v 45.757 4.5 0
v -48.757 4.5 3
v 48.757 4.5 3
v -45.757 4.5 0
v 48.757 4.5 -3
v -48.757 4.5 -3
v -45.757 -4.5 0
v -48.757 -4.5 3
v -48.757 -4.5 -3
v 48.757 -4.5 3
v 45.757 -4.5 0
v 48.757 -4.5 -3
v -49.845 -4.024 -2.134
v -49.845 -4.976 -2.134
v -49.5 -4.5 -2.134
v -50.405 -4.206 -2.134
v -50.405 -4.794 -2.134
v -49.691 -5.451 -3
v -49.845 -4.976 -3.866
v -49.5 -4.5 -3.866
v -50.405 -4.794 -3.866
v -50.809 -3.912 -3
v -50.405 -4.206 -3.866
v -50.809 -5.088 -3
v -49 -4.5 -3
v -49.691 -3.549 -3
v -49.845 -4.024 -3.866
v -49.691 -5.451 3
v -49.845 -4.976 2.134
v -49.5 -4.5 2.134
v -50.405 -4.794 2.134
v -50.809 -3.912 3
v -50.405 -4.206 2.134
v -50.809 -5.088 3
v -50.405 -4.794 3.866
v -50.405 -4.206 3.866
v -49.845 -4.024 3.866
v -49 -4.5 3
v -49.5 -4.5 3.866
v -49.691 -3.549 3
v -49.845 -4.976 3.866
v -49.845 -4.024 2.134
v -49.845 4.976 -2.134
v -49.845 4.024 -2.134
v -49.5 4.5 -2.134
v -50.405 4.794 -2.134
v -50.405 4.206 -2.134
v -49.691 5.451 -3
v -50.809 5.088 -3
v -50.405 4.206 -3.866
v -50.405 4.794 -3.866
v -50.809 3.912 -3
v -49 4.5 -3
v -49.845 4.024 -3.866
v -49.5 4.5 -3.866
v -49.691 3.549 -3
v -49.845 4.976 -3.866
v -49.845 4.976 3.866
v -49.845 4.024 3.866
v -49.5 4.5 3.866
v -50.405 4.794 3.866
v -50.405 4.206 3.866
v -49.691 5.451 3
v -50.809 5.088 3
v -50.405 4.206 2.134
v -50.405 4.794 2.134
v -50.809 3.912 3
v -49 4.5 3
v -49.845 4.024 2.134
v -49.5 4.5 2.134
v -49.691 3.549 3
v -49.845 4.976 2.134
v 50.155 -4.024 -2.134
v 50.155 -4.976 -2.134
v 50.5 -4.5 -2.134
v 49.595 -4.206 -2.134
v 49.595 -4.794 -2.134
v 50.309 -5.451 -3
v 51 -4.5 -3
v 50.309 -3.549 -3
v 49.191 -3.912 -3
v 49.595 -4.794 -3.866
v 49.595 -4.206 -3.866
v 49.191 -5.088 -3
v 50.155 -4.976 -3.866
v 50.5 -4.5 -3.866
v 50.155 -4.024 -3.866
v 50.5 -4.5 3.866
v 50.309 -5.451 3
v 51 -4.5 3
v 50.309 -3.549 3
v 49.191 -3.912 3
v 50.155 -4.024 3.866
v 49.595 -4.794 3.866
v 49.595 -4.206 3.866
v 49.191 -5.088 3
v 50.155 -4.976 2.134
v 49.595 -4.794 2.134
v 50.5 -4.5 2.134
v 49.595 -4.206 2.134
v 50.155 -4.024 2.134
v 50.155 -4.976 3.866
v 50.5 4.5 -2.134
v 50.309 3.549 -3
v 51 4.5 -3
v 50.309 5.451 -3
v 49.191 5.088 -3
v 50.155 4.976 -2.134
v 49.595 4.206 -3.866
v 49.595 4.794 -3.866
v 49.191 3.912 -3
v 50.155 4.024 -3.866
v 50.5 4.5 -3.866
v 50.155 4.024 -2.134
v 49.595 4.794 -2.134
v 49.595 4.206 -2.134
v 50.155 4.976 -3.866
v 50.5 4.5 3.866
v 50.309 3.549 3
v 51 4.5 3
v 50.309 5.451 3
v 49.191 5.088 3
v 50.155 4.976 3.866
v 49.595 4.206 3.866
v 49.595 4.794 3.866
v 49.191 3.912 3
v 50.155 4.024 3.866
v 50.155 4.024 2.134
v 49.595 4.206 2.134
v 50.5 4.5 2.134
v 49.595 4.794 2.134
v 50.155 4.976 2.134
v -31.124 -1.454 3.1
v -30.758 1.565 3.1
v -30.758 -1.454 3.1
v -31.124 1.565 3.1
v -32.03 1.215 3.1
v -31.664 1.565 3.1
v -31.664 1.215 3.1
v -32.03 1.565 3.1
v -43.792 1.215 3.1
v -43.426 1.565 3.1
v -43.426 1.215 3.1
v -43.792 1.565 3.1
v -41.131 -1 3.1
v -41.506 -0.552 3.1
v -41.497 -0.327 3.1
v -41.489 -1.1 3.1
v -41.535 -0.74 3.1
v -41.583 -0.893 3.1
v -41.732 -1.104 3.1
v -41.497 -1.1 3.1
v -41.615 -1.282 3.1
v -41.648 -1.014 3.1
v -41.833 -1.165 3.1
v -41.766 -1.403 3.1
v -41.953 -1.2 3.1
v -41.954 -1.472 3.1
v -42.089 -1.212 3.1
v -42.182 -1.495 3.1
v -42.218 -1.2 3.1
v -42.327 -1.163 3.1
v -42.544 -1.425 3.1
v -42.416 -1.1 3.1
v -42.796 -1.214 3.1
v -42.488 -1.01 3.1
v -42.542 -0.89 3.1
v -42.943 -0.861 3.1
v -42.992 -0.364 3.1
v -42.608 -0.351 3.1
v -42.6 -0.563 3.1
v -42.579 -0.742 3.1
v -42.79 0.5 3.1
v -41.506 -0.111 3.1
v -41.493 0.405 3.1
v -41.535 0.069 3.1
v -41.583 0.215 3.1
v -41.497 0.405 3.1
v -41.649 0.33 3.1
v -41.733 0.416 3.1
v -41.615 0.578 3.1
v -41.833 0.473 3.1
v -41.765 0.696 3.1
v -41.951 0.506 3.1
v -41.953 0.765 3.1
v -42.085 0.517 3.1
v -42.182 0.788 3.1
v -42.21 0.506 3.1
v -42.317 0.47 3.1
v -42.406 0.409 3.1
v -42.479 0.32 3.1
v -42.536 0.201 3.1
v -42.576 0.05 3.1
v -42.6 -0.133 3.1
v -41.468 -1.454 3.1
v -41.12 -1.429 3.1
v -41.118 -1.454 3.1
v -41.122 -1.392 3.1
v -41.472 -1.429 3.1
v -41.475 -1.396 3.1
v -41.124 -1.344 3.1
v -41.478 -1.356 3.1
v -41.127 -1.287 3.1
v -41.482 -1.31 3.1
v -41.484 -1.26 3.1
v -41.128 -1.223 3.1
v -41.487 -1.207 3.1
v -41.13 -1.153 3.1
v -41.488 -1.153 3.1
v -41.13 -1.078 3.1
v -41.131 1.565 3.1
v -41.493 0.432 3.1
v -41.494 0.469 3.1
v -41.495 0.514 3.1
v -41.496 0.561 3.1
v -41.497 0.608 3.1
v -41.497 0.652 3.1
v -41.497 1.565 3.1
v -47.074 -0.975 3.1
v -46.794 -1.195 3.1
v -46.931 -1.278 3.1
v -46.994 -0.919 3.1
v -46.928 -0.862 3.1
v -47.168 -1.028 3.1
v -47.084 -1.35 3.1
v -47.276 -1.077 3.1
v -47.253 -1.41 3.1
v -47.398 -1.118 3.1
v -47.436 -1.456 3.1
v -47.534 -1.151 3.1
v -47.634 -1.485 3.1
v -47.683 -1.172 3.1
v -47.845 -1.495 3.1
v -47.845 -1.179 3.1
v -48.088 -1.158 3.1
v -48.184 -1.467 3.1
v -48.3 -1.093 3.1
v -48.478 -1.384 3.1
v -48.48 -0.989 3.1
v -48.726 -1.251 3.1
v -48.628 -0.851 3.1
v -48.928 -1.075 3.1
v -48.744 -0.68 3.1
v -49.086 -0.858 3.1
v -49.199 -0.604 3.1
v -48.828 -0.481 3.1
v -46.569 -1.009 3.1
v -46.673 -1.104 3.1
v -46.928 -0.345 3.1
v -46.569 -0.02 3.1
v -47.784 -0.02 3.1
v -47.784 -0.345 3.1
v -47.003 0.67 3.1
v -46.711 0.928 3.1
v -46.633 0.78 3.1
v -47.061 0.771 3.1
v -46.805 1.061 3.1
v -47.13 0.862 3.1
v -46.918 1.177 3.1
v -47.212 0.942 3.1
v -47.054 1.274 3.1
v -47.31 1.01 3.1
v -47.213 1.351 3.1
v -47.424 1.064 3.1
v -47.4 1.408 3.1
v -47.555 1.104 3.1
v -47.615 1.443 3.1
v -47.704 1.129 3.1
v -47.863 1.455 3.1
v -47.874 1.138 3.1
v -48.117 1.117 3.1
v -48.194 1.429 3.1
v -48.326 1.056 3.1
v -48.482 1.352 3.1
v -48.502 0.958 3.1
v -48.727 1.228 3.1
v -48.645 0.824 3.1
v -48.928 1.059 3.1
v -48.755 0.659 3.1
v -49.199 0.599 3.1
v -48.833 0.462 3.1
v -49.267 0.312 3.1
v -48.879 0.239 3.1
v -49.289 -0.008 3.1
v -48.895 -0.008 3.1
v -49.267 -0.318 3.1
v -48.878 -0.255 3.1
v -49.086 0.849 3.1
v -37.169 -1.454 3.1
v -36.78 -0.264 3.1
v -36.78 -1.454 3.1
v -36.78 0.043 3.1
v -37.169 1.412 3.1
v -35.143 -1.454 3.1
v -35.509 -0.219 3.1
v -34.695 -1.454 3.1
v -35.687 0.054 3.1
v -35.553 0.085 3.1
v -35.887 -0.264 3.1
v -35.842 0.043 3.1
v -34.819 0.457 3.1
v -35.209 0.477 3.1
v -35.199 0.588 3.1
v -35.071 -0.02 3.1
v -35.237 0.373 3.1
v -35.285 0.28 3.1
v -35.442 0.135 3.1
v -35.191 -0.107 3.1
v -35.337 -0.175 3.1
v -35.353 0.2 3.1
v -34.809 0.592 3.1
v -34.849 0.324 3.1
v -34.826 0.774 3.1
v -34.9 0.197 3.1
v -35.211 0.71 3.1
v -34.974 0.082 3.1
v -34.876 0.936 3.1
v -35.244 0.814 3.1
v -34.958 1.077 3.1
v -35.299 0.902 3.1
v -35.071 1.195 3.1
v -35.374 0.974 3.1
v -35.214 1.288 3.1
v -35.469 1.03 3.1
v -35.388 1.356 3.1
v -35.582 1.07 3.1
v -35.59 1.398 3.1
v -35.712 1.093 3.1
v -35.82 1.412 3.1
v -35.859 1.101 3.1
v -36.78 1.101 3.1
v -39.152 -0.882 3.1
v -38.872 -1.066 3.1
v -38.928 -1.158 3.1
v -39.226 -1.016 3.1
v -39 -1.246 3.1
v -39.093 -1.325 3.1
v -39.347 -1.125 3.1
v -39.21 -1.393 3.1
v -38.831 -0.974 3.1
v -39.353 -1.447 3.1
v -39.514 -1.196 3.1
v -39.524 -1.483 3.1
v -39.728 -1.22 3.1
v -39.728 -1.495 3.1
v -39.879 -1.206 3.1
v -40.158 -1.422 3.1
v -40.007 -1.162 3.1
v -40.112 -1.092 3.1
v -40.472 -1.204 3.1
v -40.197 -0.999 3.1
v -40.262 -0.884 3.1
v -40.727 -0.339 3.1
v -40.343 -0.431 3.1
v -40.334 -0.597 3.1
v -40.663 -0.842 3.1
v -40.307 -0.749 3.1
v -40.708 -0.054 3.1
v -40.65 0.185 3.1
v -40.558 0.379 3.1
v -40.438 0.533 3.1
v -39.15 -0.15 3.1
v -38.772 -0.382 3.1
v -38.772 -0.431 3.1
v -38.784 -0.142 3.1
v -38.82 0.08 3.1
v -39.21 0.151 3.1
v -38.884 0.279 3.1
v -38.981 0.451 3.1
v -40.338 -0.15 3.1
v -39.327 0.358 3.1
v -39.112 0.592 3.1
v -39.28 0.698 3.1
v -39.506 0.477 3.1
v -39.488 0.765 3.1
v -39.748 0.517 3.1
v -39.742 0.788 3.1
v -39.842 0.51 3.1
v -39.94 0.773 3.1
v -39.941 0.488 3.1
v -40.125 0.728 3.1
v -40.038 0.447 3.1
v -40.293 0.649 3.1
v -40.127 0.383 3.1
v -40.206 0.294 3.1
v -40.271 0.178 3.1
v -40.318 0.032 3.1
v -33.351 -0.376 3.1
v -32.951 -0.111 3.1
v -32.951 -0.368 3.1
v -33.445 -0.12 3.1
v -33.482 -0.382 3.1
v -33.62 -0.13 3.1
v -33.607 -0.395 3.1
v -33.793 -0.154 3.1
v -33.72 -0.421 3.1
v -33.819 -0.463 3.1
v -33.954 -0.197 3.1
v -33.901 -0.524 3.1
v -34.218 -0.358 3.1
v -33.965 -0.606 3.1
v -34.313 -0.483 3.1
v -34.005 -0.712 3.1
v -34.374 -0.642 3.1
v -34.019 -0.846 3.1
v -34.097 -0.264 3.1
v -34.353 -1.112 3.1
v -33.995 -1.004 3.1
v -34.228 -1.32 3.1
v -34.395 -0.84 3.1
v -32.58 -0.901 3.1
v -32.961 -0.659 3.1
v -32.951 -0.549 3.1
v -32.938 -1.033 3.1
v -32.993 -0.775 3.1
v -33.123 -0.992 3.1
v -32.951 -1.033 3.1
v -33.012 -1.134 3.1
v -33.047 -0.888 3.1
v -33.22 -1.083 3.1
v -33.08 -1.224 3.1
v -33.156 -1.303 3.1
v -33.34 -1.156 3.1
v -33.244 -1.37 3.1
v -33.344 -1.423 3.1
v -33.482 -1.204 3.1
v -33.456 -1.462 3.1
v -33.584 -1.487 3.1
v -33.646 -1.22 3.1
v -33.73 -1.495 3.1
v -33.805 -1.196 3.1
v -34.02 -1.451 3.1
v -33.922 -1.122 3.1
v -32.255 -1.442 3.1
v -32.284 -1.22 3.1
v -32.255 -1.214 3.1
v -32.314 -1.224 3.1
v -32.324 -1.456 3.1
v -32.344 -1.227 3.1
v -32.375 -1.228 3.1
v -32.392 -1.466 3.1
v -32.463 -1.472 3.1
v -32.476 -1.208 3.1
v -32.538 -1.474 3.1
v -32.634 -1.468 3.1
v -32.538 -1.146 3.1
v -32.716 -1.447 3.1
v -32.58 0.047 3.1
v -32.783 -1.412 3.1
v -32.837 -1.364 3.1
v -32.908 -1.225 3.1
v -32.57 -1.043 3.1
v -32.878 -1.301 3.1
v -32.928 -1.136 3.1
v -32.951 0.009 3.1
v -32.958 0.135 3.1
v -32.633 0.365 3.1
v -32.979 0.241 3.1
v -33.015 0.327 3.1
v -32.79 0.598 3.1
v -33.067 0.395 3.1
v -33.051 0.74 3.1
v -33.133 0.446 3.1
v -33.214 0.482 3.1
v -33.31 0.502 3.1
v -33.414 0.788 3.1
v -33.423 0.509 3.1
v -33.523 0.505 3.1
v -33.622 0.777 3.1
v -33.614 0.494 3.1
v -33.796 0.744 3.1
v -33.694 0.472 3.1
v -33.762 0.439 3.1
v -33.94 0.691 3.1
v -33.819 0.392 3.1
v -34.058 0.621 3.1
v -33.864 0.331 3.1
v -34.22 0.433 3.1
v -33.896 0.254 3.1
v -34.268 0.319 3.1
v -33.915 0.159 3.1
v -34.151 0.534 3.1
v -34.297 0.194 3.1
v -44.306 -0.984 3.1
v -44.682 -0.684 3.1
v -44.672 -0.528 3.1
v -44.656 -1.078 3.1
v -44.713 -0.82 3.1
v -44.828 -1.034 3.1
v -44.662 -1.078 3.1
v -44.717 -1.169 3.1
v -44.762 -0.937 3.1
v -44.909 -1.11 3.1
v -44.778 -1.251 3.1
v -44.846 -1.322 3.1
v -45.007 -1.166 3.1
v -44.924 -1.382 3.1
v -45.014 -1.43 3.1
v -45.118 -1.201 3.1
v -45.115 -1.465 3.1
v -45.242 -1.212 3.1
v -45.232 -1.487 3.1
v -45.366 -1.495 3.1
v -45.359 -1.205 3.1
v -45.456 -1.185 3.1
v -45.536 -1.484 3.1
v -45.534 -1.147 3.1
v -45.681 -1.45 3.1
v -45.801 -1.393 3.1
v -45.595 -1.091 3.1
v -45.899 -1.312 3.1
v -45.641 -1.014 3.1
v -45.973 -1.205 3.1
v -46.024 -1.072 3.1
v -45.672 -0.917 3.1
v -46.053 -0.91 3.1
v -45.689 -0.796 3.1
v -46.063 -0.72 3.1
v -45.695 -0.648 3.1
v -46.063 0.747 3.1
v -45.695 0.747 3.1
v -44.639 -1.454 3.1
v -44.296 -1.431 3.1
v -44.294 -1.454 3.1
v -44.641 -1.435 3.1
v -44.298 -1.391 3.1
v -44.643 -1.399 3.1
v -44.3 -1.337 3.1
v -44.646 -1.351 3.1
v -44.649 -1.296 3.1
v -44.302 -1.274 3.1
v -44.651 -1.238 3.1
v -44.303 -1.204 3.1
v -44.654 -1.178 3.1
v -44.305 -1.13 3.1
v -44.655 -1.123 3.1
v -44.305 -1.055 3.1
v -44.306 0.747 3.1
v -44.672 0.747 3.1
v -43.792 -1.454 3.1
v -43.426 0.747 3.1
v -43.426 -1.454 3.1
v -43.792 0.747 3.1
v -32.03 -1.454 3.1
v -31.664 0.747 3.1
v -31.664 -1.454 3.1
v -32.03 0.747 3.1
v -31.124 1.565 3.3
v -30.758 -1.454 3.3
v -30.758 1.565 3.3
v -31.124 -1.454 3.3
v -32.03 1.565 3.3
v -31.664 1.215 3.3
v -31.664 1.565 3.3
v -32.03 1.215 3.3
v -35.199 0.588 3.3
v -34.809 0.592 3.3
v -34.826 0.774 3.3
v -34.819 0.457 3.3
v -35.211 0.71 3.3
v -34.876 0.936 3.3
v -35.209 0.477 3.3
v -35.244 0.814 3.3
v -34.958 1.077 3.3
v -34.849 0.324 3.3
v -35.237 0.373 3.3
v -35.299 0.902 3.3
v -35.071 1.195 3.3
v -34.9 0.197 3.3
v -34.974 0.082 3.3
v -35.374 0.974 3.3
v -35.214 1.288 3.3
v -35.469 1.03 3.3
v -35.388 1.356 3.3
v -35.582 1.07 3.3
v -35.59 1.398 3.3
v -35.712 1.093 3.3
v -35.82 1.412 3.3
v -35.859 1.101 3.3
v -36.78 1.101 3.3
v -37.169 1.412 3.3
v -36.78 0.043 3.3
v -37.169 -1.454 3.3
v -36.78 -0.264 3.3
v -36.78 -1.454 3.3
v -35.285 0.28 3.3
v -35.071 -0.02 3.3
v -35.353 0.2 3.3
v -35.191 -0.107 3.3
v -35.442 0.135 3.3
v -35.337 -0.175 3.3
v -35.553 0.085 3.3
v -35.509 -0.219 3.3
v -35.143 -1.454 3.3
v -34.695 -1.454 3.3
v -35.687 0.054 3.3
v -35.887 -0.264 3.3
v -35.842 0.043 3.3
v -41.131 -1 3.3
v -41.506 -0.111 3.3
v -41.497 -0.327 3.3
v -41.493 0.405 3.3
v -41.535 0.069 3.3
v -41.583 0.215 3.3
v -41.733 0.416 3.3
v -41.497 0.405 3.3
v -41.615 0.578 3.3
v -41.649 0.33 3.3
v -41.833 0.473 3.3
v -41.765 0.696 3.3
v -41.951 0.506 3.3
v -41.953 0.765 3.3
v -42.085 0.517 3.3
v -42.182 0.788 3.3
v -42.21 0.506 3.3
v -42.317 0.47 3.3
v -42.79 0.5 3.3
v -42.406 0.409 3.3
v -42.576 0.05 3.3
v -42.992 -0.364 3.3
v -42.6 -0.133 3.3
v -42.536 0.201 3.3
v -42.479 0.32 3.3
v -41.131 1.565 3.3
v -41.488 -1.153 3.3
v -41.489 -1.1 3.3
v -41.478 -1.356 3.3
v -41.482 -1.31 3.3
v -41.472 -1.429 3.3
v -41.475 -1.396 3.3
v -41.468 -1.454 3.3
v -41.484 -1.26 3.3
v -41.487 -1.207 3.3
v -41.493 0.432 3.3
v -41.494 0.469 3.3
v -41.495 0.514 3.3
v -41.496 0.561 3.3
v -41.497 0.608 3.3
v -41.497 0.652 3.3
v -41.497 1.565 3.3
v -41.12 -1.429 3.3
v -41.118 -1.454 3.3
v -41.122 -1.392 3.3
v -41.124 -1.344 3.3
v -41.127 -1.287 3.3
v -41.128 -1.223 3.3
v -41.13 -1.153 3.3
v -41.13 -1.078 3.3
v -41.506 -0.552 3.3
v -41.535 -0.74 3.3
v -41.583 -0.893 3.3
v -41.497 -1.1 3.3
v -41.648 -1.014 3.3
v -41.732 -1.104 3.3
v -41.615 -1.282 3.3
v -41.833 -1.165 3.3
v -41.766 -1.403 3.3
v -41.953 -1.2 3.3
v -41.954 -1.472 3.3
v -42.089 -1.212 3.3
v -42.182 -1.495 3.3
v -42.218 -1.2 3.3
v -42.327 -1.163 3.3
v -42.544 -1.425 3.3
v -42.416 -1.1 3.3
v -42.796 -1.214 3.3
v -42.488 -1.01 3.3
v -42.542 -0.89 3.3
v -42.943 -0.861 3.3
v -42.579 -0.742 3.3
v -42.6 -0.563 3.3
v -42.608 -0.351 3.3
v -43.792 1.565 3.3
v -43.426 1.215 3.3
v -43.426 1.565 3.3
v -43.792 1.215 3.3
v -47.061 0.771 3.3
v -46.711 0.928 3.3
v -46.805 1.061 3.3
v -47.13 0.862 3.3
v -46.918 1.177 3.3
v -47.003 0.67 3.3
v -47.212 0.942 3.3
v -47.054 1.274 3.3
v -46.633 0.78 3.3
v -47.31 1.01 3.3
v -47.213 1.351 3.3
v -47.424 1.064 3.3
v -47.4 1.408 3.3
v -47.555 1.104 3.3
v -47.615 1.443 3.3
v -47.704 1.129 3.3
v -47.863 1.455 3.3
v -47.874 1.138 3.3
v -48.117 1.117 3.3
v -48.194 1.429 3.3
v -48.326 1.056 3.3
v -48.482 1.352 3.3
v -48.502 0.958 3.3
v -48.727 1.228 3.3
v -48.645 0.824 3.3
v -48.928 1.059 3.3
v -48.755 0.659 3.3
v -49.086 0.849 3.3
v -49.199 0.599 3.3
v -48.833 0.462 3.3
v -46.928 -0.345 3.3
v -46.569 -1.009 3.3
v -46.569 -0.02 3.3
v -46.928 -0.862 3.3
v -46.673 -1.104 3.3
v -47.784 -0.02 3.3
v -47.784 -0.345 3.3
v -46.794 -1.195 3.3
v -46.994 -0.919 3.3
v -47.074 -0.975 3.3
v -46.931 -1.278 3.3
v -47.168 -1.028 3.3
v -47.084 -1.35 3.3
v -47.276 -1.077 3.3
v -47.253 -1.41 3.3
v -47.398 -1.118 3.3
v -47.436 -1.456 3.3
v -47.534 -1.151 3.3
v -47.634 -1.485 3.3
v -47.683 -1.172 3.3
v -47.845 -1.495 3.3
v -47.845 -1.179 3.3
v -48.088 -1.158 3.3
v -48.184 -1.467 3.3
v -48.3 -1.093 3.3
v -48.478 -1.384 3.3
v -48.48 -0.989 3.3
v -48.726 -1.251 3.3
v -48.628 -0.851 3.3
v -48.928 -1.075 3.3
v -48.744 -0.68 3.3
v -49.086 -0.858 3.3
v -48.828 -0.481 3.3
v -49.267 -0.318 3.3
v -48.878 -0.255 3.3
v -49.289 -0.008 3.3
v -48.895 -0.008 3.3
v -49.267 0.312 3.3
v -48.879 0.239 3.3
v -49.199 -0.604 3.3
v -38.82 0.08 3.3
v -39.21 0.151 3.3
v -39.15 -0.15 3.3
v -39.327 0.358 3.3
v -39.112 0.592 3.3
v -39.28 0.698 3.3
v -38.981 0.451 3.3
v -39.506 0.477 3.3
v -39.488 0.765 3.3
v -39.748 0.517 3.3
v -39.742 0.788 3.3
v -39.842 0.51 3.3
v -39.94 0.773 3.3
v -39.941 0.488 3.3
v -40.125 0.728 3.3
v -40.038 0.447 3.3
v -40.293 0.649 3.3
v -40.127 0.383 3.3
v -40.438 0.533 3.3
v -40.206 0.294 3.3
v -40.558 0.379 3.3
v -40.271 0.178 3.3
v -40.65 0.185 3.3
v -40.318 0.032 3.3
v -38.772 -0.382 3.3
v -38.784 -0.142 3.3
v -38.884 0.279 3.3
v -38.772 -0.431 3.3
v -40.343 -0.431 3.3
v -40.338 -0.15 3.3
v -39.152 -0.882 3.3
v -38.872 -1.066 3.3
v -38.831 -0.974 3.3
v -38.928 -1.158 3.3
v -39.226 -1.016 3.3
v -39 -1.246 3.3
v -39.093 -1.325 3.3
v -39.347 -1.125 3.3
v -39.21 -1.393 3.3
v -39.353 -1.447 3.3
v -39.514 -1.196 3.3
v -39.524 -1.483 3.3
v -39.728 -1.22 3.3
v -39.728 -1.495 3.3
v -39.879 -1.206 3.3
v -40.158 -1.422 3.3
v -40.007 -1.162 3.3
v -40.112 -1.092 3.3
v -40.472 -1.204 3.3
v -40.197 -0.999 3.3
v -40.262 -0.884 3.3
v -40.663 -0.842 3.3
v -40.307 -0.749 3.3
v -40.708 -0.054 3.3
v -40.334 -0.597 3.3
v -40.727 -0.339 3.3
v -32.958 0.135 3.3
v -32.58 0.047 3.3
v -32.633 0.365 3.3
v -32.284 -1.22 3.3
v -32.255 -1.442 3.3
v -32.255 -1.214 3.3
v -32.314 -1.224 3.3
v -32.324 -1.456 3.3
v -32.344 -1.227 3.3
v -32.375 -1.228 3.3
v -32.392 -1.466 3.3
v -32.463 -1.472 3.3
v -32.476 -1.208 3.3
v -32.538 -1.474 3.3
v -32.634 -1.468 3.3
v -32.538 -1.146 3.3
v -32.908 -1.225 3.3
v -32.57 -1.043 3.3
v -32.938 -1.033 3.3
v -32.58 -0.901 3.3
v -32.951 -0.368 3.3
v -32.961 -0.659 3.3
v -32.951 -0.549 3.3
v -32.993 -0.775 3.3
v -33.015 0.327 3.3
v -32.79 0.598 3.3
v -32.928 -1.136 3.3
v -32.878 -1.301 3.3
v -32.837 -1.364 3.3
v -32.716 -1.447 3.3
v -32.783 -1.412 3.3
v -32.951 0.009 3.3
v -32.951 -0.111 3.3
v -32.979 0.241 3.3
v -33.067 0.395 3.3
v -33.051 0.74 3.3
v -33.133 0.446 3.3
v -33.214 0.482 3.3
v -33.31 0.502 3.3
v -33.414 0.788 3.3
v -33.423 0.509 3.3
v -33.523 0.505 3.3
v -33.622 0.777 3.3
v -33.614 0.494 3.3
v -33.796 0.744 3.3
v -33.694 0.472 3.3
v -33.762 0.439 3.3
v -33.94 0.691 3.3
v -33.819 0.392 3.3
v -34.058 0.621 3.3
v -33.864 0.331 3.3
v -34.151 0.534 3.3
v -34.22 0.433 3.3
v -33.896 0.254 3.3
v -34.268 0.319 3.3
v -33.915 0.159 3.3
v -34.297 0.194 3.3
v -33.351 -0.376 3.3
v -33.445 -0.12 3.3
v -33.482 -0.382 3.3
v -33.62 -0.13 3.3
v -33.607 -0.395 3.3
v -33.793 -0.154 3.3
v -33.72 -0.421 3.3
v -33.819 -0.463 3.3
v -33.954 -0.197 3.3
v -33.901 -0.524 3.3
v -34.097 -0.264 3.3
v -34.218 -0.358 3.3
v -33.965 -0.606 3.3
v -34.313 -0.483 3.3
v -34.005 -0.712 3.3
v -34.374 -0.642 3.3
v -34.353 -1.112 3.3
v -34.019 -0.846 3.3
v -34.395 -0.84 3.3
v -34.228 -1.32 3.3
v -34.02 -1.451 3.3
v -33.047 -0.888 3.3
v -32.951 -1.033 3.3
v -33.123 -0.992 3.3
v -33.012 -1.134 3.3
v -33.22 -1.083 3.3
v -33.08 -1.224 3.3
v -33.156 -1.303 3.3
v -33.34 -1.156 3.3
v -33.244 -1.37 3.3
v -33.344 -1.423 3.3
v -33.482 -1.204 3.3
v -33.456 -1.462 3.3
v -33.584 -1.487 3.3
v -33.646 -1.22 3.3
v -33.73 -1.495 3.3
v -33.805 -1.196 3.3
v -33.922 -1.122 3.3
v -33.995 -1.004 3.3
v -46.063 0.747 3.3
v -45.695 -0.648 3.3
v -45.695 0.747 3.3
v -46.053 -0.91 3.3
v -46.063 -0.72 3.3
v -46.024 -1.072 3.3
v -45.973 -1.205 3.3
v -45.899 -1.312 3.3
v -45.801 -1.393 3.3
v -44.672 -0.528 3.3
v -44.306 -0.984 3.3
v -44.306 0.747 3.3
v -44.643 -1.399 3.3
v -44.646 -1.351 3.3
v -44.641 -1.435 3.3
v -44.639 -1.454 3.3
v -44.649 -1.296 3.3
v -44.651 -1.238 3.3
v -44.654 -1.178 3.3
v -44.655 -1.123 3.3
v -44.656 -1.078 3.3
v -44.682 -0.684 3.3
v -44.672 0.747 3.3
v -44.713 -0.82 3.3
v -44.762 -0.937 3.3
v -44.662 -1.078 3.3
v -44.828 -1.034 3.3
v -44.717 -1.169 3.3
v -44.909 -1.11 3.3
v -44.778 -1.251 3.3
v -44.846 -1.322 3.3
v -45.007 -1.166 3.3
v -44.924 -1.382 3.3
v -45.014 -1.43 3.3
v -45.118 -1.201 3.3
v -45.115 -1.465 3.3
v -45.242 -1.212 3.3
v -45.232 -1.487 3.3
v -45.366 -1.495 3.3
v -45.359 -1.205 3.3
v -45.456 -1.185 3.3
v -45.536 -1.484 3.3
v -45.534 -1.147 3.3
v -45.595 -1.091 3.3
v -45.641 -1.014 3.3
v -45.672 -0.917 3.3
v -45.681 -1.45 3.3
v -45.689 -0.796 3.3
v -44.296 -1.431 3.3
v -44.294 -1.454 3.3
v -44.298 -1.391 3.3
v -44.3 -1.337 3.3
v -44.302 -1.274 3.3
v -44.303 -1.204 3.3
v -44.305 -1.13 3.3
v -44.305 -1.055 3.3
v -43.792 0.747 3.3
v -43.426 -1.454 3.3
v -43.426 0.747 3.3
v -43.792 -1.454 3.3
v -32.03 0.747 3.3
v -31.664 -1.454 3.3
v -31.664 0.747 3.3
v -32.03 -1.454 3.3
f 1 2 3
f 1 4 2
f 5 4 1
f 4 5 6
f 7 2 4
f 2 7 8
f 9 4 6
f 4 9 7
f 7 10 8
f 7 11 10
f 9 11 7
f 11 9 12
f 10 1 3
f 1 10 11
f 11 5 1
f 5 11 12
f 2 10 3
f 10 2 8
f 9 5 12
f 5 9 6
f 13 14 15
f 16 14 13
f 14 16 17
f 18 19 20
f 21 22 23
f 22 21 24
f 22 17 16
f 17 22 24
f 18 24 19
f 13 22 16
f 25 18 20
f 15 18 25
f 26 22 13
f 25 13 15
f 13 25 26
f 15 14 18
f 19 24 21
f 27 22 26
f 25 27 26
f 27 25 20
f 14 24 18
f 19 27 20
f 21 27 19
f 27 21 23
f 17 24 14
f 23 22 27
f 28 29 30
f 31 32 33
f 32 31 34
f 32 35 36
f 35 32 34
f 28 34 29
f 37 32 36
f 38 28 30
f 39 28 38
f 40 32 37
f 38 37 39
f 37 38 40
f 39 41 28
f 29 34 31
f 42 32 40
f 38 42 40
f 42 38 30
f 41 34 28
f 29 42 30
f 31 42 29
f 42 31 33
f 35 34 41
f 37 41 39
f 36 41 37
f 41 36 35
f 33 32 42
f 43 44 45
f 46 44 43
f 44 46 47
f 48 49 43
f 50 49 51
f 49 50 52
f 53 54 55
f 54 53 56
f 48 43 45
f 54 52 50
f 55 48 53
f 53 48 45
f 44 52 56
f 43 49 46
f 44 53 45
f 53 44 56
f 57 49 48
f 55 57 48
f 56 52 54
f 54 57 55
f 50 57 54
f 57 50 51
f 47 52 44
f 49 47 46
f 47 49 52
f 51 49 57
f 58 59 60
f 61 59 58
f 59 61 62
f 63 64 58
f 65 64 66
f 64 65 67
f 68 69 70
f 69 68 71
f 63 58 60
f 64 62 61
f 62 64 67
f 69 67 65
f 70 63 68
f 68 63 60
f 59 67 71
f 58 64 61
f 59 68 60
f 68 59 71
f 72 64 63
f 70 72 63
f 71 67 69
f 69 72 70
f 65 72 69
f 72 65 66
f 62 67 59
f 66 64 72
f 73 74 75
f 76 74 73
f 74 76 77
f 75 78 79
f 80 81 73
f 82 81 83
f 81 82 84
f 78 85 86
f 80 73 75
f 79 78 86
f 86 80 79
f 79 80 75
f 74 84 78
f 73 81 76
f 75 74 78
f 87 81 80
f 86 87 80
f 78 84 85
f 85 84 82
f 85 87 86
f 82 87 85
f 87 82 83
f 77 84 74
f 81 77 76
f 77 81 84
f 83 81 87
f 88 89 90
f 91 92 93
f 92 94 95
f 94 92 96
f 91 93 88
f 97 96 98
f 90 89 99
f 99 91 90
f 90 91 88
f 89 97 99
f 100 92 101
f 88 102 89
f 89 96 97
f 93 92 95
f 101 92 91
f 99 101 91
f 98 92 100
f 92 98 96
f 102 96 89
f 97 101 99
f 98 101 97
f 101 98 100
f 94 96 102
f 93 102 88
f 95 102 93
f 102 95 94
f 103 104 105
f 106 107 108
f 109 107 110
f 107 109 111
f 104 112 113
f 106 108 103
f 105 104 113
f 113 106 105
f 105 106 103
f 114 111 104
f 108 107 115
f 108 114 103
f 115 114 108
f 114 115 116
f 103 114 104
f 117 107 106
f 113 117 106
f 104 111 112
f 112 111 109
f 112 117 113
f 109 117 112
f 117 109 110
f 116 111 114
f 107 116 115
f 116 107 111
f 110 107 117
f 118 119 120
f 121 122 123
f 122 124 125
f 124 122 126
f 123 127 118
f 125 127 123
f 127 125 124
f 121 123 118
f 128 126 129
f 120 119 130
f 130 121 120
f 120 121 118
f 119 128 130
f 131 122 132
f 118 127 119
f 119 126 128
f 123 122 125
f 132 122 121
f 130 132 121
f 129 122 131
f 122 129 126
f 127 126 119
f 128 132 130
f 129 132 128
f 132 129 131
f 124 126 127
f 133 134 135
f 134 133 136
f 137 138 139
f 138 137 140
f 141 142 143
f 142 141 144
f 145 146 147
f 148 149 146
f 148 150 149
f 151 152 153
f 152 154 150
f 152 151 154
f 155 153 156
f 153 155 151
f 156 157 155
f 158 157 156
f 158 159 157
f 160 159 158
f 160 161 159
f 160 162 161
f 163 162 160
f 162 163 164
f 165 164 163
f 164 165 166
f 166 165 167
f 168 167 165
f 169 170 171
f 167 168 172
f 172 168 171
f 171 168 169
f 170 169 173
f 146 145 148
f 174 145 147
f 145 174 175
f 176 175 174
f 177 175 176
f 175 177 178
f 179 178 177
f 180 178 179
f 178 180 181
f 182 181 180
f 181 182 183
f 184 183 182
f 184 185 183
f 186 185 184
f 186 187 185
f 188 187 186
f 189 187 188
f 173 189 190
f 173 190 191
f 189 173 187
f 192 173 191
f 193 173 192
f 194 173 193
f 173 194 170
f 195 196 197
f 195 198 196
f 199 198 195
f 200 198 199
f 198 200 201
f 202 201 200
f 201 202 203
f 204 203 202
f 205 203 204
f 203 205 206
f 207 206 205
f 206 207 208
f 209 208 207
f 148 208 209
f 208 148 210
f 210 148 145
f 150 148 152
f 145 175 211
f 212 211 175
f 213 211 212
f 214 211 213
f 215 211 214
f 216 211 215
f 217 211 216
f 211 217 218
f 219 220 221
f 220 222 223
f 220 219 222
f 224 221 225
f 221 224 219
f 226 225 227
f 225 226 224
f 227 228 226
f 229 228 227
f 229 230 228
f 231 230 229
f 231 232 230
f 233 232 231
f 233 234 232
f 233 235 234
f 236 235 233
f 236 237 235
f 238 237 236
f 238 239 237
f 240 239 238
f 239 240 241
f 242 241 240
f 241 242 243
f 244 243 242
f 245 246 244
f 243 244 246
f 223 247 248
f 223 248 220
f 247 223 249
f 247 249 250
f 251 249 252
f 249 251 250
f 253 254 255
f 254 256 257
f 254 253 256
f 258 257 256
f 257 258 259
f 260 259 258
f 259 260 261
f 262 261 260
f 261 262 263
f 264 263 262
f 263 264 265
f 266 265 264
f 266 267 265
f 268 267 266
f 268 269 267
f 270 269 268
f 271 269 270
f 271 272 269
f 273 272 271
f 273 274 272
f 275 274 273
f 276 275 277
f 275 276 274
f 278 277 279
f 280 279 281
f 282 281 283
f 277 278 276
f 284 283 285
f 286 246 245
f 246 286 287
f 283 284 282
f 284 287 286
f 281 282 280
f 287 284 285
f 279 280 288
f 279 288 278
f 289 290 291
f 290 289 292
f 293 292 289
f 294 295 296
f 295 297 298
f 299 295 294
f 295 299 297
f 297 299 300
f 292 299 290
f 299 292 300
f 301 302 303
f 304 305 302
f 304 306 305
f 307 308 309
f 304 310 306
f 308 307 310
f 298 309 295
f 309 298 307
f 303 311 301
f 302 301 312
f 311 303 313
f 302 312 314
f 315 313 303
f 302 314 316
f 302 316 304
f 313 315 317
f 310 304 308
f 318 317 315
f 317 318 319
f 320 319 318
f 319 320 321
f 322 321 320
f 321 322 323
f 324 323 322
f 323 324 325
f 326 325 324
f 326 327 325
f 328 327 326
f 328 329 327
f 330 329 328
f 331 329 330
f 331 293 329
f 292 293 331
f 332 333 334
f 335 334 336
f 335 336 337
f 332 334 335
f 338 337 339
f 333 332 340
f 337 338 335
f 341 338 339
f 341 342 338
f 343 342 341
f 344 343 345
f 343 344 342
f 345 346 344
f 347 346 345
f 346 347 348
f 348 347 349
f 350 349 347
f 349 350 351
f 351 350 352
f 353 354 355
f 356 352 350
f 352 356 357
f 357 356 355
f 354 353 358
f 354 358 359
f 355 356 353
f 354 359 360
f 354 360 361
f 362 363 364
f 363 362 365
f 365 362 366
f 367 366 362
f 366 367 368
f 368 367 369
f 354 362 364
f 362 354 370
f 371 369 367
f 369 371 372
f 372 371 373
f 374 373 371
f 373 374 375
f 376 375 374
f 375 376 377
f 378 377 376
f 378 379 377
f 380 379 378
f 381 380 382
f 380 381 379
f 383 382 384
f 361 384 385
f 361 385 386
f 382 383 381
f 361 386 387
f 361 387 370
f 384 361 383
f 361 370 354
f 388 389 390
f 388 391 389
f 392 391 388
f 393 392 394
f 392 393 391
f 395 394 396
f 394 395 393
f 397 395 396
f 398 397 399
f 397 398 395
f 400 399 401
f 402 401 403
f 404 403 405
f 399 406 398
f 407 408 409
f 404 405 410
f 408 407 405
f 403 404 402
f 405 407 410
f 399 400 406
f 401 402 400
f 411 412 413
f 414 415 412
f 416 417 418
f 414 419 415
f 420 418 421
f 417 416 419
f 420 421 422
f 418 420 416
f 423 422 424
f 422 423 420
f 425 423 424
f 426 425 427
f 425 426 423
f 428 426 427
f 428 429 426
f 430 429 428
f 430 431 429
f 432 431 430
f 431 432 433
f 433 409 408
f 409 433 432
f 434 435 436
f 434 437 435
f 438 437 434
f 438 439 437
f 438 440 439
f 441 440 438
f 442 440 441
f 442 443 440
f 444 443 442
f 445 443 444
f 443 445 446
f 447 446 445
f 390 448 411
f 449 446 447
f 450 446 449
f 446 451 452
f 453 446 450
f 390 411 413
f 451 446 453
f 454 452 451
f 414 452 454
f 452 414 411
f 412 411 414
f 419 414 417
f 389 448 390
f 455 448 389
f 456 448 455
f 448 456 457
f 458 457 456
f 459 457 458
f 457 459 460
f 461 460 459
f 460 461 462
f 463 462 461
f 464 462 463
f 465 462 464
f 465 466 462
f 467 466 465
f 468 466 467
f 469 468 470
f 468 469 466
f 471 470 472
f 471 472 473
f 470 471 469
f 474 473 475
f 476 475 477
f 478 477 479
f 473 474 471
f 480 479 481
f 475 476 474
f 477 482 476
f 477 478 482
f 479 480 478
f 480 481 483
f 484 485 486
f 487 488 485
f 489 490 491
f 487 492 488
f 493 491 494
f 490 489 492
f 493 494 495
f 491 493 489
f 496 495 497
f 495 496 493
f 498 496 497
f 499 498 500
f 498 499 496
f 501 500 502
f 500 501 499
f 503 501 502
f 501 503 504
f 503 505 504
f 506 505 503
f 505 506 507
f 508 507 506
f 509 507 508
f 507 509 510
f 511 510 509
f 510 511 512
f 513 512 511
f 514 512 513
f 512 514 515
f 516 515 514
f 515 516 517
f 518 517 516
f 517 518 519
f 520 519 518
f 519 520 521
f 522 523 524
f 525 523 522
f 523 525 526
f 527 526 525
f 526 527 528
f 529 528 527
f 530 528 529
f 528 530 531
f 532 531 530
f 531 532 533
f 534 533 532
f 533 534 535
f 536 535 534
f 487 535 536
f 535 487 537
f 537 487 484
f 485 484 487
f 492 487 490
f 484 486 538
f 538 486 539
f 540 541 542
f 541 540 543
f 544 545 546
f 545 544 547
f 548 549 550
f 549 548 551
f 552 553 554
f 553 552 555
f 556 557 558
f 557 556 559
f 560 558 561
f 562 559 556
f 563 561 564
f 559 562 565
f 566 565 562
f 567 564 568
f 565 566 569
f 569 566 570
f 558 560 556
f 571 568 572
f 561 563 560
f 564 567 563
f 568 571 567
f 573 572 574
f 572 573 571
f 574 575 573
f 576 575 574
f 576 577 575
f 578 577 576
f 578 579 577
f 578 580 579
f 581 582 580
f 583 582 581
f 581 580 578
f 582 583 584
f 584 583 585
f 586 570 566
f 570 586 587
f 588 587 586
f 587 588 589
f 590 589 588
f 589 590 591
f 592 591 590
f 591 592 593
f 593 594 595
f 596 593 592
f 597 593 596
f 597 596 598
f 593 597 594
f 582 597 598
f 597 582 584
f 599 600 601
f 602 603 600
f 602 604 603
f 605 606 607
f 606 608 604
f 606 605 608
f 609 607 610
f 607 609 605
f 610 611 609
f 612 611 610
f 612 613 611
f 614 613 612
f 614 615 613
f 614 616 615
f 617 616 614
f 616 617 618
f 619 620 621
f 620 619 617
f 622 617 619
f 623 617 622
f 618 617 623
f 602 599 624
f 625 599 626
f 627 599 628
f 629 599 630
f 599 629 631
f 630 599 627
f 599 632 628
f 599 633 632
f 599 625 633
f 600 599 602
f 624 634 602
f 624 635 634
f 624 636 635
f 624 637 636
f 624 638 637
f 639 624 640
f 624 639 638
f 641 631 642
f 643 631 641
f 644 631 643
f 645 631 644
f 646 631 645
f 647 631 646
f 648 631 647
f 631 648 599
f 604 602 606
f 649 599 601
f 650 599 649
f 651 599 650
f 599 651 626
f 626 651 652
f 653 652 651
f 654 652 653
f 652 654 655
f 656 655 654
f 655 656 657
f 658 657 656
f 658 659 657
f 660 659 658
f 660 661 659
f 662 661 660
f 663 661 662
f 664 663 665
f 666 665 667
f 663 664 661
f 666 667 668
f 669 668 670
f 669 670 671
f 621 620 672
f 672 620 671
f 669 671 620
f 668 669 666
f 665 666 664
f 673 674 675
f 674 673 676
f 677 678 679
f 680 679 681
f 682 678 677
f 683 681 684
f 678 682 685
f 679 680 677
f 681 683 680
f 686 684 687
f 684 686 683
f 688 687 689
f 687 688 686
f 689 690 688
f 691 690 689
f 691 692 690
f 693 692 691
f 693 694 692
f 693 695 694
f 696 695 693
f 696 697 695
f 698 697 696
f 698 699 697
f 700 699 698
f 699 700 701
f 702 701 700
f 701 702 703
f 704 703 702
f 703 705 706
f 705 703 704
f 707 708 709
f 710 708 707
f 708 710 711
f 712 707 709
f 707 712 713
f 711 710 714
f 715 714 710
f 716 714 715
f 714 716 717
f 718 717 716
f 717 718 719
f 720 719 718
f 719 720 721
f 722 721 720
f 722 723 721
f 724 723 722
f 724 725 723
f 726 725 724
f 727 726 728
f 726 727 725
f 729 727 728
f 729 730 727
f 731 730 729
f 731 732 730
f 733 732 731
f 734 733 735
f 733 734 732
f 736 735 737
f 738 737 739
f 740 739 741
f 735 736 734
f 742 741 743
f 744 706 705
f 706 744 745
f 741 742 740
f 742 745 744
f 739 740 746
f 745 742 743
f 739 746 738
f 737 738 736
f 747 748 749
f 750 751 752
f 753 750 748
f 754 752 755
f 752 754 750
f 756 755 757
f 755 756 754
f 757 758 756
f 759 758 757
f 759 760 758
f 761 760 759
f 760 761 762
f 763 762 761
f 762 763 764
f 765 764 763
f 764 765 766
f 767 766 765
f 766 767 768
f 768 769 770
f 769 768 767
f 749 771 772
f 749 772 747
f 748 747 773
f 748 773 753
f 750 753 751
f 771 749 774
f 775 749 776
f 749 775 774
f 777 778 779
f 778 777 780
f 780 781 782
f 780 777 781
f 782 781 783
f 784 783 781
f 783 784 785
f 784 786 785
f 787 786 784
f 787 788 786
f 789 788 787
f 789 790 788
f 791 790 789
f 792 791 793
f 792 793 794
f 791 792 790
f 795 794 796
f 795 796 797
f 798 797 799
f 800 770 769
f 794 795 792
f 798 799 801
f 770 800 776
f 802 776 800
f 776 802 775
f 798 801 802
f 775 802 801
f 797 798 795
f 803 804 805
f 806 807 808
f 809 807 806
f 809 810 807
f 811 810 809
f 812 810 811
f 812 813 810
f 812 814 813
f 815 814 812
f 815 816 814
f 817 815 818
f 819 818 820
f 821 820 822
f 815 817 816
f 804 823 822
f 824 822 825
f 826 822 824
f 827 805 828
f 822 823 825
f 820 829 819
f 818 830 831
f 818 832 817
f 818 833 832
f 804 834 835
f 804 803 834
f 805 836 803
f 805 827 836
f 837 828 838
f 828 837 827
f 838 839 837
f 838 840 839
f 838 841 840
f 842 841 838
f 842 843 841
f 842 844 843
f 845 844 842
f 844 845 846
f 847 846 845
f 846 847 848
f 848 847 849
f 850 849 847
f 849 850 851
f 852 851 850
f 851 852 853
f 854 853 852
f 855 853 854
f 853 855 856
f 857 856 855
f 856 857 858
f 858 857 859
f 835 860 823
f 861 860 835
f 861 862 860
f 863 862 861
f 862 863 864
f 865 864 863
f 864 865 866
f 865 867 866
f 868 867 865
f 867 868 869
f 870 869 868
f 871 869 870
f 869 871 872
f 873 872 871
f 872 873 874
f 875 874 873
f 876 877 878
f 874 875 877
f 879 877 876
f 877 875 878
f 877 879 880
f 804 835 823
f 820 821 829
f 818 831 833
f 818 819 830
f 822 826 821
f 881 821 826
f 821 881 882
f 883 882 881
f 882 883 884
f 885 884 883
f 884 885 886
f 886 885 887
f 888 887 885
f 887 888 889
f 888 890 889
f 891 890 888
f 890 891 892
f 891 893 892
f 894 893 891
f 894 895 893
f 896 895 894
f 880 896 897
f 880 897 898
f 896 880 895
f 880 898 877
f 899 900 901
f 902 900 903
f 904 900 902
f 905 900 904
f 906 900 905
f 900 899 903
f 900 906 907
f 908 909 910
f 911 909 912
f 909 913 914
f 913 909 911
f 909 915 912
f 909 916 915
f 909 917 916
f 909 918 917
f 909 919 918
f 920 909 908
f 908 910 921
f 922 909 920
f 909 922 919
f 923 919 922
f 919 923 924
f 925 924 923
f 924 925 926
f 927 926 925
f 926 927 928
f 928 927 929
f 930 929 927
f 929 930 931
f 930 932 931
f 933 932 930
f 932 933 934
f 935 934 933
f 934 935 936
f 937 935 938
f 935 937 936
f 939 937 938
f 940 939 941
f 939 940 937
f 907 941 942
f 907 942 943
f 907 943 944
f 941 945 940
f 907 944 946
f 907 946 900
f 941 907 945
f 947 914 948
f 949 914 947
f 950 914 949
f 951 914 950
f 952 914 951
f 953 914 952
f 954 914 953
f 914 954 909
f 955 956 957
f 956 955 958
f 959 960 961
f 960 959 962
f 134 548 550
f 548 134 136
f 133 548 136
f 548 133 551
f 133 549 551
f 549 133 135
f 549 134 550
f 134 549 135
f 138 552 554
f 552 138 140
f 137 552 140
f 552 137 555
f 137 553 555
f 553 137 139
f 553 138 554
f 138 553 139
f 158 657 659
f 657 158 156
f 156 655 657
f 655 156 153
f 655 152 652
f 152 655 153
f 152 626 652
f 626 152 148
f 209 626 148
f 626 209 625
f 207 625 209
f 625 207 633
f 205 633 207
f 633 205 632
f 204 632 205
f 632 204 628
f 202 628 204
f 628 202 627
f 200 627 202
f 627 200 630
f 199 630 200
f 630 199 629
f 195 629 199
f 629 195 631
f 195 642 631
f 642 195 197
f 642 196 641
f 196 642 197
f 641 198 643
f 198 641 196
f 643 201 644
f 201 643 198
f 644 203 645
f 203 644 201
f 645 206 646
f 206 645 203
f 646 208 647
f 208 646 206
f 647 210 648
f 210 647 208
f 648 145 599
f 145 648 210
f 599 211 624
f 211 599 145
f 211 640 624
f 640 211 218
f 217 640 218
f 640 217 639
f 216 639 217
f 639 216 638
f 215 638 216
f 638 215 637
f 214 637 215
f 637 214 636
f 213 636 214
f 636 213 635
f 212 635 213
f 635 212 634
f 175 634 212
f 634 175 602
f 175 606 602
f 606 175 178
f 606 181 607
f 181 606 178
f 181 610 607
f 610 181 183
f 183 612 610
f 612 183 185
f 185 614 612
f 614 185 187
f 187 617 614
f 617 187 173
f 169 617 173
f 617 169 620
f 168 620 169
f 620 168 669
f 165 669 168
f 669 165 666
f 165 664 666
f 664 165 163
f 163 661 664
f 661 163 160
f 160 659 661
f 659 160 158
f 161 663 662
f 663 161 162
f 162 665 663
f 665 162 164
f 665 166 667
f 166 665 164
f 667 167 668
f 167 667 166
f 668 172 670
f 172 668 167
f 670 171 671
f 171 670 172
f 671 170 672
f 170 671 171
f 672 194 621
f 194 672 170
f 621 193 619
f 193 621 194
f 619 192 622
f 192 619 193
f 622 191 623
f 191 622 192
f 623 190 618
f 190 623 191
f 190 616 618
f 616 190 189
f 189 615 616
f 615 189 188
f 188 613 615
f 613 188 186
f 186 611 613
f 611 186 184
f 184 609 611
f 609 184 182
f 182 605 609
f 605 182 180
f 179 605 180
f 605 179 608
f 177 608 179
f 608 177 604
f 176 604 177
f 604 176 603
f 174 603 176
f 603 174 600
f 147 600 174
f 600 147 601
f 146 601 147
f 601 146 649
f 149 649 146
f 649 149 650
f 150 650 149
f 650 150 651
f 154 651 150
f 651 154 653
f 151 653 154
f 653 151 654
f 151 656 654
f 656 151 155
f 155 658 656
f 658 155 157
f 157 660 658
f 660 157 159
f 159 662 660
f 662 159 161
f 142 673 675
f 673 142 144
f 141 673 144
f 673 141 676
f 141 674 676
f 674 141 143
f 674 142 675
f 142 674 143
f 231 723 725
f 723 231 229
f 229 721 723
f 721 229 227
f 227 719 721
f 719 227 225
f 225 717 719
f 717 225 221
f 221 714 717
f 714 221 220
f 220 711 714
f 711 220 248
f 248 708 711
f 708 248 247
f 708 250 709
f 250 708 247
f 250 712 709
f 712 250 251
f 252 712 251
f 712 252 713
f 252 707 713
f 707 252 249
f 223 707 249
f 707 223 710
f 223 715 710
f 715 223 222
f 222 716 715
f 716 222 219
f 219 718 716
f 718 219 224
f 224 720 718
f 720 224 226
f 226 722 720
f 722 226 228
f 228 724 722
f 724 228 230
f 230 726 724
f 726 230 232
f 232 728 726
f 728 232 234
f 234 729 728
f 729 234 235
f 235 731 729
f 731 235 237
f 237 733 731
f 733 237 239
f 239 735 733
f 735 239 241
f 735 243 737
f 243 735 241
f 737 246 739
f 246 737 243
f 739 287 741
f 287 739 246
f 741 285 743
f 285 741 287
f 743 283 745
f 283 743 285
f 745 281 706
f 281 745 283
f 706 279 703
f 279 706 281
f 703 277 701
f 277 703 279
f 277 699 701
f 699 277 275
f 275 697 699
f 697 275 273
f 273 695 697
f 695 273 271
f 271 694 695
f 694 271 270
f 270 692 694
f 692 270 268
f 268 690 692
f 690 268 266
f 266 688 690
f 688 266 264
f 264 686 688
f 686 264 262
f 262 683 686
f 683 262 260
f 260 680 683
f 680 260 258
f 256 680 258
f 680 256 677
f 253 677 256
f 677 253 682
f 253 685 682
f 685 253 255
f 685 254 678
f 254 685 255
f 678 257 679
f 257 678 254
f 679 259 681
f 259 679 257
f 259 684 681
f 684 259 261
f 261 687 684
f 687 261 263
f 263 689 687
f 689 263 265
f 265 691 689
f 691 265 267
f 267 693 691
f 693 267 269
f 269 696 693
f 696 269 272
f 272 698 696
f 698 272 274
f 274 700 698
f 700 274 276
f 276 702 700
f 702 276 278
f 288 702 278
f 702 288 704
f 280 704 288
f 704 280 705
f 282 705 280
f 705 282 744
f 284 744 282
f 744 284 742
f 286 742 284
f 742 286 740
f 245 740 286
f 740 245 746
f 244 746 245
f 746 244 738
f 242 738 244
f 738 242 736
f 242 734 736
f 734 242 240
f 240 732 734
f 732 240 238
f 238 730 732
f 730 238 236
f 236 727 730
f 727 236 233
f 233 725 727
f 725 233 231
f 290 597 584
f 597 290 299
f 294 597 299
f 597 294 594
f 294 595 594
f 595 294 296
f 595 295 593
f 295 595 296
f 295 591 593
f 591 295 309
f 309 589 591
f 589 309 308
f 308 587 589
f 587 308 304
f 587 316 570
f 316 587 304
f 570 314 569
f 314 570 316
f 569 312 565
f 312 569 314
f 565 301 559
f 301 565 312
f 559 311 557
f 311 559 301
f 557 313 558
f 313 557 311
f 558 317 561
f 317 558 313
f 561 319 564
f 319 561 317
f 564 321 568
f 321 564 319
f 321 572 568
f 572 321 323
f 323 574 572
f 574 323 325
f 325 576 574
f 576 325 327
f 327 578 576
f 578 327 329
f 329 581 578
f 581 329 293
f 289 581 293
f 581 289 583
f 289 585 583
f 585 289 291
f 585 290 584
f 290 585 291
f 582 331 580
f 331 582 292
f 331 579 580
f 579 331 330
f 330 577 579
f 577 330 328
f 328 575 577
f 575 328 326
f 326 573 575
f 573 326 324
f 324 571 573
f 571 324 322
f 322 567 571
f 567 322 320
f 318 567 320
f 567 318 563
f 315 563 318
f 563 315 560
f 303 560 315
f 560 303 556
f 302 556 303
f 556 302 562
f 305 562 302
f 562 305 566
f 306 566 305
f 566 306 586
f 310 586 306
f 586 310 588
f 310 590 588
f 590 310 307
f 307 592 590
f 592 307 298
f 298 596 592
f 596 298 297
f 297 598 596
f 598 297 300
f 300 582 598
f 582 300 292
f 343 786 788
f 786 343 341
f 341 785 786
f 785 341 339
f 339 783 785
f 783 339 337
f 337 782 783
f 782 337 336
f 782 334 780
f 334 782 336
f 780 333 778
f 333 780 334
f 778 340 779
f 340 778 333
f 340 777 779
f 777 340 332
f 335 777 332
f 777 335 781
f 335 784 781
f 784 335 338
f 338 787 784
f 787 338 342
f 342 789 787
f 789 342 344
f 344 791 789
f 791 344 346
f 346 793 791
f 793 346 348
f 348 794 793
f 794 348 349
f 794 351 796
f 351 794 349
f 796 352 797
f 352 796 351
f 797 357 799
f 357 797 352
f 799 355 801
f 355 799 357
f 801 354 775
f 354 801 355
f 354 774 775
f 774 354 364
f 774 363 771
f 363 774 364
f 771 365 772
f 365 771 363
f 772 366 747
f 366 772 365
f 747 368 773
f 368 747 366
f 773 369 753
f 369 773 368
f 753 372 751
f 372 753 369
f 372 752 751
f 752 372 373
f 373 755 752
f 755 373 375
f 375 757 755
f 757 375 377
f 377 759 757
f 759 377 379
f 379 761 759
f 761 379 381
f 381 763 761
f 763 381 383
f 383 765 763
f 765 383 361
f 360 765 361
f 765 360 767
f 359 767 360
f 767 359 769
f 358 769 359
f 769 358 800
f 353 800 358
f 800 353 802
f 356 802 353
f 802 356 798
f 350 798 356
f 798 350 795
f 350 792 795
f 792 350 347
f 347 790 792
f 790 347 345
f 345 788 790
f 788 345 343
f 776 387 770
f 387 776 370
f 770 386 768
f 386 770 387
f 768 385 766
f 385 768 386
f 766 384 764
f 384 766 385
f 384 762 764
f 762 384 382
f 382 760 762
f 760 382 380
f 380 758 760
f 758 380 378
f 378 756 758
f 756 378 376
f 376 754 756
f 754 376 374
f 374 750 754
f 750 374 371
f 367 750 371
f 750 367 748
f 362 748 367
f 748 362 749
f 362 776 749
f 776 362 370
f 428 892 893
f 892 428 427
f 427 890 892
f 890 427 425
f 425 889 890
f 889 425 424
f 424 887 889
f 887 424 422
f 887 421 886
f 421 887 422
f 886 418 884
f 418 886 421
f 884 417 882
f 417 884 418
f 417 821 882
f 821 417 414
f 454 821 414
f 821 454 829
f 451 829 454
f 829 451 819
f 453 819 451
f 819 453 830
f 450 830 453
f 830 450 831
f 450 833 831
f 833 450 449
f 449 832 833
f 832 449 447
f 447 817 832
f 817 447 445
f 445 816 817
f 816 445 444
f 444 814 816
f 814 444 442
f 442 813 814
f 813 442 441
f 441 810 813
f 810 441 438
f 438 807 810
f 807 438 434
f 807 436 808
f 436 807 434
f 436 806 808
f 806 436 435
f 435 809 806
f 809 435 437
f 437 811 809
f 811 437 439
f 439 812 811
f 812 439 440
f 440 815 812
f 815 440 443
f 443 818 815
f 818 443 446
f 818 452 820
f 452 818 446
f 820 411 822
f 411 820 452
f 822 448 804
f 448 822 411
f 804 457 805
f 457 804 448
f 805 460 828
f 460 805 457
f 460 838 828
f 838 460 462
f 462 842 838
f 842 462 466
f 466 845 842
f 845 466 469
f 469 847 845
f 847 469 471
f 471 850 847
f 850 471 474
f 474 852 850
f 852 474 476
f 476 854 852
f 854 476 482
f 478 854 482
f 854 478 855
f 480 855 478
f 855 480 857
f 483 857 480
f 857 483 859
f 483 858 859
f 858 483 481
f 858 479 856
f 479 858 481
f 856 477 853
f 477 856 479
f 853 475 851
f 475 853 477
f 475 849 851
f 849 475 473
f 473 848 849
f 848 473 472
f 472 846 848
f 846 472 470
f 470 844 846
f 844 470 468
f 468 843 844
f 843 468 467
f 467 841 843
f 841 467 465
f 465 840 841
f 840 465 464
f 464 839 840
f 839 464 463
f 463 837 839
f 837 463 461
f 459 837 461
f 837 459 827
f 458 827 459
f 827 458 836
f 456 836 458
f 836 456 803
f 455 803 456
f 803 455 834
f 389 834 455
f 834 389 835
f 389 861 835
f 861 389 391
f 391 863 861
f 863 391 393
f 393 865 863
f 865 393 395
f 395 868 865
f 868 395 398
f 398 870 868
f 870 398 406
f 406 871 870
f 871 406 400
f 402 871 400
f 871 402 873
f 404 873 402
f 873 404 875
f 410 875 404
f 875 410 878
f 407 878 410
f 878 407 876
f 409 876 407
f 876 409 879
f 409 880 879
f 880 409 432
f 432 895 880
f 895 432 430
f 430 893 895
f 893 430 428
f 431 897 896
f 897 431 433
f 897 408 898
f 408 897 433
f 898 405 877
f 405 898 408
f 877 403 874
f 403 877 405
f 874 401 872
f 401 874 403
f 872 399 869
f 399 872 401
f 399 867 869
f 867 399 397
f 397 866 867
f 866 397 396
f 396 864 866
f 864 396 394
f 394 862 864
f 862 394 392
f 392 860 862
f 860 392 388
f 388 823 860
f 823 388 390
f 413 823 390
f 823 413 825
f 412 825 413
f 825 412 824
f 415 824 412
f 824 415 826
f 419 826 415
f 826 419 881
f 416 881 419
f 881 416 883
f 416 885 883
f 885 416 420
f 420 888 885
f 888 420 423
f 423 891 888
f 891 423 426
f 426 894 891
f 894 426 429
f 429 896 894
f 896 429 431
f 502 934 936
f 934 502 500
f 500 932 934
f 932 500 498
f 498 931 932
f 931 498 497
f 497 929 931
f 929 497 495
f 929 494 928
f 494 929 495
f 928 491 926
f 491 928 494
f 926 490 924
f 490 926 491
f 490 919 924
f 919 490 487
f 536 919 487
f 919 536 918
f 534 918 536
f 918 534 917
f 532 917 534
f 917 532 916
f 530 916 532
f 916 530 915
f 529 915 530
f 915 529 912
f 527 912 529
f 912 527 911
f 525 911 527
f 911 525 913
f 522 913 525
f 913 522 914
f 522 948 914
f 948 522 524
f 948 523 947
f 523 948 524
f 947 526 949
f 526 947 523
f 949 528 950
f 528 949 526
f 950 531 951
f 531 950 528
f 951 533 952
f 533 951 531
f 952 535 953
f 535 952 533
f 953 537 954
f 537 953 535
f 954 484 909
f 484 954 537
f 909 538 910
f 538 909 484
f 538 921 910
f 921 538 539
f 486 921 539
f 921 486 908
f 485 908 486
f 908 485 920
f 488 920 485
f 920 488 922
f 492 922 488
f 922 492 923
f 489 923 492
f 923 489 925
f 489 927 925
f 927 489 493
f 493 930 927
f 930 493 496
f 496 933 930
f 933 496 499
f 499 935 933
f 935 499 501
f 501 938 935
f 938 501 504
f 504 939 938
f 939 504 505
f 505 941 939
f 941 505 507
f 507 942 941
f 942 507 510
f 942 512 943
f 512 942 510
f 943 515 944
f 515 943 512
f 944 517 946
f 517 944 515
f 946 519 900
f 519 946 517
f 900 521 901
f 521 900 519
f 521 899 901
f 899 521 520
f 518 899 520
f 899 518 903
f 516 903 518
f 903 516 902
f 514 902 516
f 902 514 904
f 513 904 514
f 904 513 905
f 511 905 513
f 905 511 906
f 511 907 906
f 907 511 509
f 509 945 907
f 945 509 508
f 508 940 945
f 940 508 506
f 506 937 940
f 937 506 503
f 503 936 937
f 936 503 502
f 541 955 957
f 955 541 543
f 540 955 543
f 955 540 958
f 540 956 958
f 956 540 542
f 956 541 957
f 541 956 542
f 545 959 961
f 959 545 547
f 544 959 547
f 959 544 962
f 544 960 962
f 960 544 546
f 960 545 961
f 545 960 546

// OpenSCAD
module rail_body() {
    cube([100, 9, 6], center = true);
}

module end_chamfers() {
    translate([-50, 0, 0])
        rotate([0, 45, 0])
        cube([6, 9, 6], center = true);
    translate([50, 0, 0])
        rotate([0, -45, 0])
        cube([6, 9, 6], center = true);
}

module edge_fillets() {
    for (x = [-50, 50])
        for (y = [-4.5, 4.5])
            for (z = [-3, 3])
                translate([x, y, z])
                    sphere(r = 1);
}

module engraved_markings() {
    translate([-40, 0, 3.1])
        linear_extrude(height = 0.2)
            text("Guide Rail", size = 3, valign = "center", halign = "center");
}

module linear_guide_rail() {
    difference() {
        rail_body();
        end_chamfers();
    }
    edge_fillets();
    engraved_markings();
}

linear_guide_rail();
